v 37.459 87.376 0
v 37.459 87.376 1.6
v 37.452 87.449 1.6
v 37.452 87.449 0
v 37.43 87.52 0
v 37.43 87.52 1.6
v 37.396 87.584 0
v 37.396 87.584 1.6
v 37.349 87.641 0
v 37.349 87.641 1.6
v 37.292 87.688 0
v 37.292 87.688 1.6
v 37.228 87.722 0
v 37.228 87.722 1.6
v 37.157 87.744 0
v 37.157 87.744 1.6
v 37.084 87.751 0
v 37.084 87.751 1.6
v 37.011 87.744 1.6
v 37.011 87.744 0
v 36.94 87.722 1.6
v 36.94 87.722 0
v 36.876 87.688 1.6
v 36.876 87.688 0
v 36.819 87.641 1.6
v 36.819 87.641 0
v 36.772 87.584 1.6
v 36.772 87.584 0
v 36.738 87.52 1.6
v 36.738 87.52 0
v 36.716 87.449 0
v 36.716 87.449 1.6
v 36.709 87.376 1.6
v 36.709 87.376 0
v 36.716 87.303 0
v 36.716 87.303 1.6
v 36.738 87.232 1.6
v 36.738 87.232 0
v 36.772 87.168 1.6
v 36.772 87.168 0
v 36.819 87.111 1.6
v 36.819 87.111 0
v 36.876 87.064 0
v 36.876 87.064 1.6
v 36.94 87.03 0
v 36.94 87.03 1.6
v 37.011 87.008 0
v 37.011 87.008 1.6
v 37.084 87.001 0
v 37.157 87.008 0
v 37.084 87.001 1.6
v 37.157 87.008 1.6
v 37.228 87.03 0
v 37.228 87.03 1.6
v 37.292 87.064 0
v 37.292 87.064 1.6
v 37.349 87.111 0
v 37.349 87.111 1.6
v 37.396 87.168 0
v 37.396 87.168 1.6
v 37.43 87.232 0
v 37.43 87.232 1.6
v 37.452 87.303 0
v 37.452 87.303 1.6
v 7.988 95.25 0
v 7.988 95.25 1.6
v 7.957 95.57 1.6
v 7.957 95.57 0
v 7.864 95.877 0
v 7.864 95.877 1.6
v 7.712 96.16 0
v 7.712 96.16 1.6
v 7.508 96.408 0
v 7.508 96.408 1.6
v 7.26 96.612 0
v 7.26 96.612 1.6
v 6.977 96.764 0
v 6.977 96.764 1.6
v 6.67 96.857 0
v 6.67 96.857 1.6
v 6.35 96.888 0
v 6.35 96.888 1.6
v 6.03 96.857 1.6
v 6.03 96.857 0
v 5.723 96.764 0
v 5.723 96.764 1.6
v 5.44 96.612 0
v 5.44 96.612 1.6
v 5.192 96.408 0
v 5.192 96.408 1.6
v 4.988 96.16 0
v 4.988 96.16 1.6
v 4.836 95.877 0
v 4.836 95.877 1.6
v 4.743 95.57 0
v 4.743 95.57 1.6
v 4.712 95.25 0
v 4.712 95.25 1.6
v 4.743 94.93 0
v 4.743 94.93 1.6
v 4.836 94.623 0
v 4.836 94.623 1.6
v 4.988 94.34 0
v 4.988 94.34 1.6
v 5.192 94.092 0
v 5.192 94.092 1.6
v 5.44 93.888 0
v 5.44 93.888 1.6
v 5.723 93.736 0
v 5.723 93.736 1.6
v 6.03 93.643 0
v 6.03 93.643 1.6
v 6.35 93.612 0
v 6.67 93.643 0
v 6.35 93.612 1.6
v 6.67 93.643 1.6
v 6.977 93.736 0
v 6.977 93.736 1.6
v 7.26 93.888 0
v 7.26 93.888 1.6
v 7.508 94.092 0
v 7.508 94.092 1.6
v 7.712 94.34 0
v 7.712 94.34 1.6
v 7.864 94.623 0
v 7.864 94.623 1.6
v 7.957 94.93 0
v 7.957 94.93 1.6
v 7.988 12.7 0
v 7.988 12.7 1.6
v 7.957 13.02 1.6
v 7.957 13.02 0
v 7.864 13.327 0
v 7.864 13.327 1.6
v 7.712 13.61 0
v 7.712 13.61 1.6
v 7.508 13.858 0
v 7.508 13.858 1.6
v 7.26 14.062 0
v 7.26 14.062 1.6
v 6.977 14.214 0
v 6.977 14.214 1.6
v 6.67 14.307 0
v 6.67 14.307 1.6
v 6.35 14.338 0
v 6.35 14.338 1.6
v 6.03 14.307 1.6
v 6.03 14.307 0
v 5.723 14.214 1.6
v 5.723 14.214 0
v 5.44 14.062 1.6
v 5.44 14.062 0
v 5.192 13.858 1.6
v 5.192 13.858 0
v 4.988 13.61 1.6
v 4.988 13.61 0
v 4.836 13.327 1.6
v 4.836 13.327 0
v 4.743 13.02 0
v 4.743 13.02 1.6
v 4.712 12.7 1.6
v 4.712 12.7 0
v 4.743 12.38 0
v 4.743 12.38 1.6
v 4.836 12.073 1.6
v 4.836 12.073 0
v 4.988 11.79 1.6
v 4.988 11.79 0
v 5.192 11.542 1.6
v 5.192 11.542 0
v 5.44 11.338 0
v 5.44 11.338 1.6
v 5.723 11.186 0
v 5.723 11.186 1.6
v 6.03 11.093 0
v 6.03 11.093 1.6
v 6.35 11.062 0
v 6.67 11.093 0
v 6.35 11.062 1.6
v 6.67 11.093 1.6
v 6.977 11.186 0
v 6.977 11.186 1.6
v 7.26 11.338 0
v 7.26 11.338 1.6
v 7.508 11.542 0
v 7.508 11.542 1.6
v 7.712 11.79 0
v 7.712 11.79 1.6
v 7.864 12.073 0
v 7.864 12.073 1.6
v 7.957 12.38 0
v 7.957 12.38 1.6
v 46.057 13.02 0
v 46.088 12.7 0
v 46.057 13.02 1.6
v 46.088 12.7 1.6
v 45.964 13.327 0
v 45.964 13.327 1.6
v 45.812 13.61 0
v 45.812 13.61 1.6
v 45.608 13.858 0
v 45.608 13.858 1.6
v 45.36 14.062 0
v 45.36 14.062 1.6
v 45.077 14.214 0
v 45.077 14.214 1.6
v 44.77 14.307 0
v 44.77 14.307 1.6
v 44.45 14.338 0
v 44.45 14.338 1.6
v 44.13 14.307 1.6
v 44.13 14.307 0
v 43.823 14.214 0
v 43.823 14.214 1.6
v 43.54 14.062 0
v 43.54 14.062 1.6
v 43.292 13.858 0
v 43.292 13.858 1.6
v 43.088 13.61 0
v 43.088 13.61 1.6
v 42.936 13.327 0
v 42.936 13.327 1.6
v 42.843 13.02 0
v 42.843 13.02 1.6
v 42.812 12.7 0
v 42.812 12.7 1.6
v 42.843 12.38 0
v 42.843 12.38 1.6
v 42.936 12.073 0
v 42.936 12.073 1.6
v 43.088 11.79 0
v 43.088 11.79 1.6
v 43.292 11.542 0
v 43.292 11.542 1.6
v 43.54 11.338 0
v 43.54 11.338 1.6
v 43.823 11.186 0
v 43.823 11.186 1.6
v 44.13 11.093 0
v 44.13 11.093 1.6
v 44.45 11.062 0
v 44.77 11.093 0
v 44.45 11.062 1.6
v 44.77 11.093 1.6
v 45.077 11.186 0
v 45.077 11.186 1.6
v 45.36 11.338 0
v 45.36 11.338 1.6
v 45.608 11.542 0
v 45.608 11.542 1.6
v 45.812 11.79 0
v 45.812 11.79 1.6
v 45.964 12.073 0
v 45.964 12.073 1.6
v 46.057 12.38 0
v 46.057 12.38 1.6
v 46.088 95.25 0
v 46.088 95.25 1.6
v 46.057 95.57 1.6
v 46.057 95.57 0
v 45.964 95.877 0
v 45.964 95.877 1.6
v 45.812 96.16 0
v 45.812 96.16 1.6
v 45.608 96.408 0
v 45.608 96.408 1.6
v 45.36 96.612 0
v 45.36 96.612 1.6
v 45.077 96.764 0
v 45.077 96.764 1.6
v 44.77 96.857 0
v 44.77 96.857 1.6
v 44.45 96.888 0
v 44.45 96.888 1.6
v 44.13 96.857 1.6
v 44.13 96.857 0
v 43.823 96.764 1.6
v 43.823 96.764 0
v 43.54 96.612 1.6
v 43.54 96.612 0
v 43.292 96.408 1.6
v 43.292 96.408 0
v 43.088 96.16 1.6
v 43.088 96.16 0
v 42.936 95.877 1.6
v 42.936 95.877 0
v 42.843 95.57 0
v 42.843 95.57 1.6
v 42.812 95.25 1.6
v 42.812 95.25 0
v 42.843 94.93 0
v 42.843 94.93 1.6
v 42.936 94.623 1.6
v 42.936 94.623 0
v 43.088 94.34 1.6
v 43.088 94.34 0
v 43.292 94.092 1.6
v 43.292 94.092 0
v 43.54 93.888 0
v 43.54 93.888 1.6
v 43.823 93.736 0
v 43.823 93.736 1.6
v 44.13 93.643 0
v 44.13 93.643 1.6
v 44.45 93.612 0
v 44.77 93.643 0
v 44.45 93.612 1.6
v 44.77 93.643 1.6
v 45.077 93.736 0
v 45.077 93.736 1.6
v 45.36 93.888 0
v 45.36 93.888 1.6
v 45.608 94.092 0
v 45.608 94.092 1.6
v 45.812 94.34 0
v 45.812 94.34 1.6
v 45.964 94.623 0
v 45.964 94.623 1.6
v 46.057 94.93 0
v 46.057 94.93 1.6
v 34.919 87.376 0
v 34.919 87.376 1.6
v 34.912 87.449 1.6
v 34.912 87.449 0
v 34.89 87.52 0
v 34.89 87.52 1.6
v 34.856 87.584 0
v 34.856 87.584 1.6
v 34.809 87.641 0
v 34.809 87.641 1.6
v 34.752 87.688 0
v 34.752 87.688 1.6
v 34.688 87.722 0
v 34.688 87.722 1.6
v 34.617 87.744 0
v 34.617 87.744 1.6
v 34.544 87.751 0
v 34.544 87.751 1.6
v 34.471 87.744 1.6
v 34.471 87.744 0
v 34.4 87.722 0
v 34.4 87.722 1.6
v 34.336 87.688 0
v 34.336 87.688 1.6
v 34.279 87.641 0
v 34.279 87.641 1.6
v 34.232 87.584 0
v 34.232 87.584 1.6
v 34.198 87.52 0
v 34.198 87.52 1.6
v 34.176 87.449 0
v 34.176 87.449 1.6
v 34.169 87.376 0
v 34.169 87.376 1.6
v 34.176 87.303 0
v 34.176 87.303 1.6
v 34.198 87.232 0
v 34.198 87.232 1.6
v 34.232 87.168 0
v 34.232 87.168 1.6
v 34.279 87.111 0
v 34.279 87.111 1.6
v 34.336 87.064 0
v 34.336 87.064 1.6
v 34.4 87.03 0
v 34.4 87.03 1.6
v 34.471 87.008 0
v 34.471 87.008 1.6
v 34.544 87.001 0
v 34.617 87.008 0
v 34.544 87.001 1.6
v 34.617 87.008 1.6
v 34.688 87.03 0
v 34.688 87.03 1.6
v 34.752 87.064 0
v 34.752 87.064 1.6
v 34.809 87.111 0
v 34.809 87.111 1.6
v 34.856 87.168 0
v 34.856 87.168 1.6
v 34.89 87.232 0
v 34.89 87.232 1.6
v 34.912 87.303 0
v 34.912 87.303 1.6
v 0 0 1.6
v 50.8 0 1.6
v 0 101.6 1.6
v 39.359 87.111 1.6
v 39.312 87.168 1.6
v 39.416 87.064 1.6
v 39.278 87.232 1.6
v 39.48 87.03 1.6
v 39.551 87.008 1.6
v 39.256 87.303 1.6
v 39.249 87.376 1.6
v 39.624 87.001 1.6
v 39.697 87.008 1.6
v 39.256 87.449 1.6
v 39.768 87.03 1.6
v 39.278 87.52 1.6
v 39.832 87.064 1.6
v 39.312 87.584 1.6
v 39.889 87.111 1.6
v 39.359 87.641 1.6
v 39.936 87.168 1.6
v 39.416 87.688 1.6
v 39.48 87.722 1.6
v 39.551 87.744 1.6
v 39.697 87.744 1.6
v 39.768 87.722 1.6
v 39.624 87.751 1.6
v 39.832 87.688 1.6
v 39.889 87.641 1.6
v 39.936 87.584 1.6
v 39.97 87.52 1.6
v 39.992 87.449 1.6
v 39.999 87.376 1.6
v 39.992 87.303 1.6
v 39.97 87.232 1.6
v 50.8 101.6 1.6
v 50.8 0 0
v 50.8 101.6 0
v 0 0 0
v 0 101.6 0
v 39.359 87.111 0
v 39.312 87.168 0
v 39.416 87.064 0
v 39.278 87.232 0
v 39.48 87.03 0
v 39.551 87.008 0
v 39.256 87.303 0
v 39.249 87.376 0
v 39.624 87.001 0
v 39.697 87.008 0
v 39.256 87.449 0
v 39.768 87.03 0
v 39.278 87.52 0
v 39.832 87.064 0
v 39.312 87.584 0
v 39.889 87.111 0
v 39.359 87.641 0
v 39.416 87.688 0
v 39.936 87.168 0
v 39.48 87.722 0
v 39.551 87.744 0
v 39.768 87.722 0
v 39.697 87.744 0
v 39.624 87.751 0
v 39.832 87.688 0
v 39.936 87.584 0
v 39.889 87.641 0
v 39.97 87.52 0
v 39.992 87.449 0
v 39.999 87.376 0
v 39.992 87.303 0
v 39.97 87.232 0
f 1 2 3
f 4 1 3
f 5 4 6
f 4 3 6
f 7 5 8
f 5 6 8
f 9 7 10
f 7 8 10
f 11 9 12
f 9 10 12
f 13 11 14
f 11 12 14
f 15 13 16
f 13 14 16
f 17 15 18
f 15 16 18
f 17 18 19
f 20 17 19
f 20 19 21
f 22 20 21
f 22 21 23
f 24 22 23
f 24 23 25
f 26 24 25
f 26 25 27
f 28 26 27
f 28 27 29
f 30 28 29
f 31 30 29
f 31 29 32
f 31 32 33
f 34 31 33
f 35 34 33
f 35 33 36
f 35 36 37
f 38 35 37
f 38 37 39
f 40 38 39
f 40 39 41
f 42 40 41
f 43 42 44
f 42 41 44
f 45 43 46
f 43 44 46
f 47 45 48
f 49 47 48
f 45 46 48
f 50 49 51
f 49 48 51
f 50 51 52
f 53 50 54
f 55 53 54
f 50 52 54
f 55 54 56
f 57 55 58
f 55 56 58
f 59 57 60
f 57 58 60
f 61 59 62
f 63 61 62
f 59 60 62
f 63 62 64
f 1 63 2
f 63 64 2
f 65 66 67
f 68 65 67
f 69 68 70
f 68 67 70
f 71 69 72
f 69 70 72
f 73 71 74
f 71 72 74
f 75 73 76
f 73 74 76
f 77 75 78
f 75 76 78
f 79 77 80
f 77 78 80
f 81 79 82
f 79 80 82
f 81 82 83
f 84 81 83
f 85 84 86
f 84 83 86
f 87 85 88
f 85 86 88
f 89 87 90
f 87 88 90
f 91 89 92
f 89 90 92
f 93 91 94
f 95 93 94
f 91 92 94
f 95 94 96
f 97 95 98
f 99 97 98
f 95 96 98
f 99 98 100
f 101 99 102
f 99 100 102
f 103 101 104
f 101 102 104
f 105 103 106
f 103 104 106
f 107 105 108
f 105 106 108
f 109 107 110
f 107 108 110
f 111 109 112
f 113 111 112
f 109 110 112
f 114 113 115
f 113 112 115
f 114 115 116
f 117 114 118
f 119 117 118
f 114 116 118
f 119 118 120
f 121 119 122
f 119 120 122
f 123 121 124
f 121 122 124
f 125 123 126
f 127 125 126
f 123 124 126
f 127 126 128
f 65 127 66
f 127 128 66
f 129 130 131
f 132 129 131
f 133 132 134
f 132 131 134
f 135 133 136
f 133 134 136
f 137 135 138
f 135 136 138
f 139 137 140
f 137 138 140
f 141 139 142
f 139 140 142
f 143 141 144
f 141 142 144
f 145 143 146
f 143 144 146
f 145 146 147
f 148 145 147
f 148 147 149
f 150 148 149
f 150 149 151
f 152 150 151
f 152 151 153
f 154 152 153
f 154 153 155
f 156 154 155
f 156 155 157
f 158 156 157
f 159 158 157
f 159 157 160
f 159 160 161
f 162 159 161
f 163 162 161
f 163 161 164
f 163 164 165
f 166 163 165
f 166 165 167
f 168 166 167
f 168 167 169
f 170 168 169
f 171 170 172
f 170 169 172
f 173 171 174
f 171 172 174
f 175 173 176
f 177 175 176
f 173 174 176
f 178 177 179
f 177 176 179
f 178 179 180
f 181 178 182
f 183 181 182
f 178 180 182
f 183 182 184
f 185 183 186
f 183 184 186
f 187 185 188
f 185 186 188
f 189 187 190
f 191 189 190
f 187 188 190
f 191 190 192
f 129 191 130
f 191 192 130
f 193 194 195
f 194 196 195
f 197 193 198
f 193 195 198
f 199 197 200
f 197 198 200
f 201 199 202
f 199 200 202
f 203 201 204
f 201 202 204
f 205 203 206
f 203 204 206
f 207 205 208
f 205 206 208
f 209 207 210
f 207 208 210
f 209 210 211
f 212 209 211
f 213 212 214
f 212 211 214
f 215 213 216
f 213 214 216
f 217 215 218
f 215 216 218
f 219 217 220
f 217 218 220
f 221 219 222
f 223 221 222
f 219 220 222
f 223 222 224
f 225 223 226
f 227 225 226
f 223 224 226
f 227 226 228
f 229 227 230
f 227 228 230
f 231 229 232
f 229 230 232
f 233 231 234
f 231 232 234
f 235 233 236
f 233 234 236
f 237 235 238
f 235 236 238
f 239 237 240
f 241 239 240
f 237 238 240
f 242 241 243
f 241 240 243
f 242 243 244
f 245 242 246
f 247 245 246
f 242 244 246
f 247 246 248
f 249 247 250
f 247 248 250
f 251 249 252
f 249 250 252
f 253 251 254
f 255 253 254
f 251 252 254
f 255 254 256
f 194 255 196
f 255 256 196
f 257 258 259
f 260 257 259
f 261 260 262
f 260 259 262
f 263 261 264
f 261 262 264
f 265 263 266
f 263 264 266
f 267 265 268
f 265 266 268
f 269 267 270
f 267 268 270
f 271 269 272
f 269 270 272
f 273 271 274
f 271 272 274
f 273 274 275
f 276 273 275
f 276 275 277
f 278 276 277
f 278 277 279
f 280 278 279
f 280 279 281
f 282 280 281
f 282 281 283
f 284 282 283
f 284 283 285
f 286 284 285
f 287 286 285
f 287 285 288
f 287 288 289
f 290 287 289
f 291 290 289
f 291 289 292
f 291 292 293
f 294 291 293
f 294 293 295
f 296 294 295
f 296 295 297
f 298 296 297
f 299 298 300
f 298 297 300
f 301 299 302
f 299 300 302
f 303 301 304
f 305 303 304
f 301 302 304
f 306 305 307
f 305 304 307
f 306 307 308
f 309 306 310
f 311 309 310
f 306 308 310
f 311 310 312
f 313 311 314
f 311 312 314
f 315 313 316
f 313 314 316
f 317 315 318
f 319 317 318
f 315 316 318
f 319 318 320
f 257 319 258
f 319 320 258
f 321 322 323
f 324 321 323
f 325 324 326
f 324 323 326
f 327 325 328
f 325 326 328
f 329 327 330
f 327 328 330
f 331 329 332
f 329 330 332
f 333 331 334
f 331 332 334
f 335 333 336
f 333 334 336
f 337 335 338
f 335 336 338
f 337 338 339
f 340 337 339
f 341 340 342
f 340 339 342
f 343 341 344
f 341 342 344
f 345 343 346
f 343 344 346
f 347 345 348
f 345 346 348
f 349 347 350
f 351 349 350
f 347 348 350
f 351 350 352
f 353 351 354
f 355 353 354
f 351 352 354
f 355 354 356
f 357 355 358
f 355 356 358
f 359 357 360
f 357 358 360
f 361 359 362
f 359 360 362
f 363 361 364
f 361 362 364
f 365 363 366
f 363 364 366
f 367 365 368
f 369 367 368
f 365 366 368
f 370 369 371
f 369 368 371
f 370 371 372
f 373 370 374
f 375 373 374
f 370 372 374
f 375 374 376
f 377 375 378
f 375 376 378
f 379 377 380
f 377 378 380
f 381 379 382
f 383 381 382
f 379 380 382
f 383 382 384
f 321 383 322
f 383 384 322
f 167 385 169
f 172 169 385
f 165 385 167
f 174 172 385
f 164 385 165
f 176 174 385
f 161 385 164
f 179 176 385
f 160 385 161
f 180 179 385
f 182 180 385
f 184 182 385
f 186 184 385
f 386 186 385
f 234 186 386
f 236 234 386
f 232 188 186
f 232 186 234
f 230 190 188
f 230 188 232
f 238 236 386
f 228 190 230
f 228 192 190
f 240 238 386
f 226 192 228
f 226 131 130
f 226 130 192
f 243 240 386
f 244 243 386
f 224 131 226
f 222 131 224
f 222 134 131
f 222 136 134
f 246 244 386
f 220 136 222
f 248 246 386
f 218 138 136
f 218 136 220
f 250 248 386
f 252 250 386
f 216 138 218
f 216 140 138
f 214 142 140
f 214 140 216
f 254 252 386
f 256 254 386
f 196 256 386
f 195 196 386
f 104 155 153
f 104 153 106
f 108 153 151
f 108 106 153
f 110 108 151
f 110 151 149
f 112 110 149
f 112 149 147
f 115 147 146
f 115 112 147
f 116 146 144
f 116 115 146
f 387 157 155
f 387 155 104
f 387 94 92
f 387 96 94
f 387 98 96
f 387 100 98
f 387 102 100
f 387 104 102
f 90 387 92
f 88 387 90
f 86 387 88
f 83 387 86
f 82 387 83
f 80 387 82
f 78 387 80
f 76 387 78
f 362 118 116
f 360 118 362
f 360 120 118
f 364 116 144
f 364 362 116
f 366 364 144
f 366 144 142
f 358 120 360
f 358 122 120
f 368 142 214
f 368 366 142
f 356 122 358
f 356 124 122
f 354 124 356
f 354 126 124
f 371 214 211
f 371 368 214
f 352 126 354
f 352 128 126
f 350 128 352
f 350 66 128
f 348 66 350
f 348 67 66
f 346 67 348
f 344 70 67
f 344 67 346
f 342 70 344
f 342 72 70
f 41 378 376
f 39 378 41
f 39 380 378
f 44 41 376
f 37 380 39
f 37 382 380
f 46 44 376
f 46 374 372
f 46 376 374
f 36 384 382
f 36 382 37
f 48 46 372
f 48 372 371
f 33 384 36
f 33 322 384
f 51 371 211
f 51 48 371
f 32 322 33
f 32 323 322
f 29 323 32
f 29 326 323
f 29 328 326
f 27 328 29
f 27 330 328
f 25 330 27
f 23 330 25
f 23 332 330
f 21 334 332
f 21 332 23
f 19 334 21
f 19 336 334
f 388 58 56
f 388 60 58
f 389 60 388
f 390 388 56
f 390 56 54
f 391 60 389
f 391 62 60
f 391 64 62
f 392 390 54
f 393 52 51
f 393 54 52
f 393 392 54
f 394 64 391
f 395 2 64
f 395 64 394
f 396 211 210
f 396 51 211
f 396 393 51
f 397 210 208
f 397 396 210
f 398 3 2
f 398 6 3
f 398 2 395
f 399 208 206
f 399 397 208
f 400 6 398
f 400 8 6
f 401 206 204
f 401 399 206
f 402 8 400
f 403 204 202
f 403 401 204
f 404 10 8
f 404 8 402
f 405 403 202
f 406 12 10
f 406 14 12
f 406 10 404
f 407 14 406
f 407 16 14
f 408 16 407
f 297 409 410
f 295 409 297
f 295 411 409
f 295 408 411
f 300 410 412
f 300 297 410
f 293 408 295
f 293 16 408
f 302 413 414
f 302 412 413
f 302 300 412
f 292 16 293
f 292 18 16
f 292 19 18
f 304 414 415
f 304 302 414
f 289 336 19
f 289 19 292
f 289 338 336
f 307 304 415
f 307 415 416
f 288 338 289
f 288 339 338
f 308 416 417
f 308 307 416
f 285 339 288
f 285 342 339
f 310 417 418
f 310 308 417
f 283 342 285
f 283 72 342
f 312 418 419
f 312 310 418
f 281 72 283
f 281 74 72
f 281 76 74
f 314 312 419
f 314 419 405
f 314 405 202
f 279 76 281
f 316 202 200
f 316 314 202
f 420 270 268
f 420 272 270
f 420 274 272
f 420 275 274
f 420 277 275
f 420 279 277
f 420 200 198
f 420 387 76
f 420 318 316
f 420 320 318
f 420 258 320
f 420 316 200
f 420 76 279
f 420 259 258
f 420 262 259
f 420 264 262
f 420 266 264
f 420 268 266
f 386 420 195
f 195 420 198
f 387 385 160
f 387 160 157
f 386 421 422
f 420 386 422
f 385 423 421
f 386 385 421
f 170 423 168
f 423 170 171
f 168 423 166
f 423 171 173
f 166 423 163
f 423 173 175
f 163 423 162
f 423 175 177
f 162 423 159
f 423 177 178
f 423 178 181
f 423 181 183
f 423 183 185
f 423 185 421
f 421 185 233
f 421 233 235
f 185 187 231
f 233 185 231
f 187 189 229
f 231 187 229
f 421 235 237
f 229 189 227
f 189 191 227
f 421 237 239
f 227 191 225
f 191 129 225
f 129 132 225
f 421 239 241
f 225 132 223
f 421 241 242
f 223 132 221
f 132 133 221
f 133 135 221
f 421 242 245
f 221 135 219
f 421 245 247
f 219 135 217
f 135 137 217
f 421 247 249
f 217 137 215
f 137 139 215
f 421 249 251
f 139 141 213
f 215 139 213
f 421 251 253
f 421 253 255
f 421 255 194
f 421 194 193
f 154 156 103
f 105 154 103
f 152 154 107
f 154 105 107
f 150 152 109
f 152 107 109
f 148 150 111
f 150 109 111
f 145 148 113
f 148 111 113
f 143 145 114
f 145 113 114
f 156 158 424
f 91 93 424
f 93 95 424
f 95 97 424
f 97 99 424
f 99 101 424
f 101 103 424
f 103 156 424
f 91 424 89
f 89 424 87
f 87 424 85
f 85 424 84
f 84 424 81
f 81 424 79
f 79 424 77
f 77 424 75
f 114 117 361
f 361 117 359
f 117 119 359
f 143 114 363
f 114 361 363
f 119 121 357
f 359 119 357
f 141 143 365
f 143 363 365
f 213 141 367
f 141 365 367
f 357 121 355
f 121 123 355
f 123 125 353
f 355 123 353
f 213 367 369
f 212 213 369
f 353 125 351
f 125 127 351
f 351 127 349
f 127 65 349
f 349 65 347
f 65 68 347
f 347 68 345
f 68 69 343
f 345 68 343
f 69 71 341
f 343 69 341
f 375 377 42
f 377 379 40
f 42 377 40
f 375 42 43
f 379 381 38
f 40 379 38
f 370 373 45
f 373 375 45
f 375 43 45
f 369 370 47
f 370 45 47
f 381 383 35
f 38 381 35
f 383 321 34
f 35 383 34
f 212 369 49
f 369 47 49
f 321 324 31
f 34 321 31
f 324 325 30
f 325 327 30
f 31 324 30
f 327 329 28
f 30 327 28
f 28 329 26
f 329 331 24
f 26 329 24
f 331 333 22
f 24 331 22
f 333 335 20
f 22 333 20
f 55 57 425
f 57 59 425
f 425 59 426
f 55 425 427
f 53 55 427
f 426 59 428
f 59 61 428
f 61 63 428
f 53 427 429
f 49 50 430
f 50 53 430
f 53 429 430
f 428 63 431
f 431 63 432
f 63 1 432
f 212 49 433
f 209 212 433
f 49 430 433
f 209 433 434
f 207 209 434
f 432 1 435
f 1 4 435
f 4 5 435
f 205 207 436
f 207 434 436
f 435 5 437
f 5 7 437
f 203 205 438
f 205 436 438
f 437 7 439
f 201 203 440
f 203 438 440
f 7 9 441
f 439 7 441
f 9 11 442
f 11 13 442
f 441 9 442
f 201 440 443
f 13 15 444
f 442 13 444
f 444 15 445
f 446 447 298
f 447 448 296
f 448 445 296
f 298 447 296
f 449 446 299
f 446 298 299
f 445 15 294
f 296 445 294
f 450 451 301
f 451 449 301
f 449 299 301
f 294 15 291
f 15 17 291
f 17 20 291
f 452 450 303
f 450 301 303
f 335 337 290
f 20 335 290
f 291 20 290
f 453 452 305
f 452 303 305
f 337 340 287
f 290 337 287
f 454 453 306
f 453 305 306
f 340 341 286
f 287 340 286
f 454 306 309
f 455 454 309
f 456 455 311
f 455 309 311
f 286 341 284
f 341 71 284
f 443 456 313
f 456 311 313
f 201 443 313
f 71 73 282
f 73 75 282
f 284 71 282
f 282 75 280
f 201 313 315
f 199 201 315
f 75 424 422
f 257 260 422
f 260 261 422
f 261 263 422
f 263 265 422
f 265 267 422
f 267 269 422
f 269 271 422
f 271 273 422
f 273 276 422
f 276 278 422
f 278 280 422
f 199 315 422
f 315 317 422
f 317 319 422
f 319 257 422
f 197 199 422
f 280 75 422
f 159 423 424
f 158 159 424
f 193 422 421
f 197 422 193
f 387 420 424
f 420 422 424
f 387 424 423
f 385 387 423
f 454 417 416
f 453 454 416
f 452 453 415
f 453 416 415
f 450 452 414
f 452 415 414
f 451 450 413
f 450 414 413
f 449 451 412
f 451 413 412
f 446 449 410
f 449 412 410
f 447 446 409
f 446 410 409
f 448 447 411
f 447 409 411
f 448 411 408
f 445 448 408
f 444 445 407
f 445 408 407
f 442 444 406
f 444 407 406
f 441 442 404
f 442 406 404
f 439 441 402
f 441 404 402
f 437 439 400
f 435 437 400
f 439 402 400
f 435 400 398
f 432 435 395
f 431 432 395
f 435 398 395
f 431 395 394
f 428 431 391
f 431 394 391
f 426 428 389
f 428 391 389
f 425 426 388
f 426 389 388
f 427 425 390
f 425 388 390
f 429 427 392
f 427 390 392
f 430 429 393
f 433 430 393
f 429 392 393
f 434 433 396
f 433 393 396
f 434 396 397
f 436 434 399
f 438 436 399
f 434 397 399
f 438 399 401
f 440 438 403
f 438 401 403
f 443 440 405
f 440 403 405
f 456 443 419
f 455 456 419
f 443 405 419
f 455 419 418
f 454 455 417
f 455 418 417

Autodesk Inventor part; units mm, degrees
ref_plane "YZ Plane" through (0, 0, 0) normal (1, 0, 0) x (0, 1, 0)
ref_plane "XZ Plane" through (0, 0, 0) normal (0, 1, 0) x (-1, 0, 0)
ref_plane "XY Plane" through (0, 0, 0) normal (0, 0, 1) x (1, 0, 0)
sketch "Sketch1" plane through (0, 0, 0) normal (0, 0, 1) x (1, 0, 0)
  line L0 (0, 0) -> (50.8, 0)
  line L1 (50.8, 0) -> (50.8, 101.6)
  line L2 (50.8, 101.6) -> (0, 101.6)
  line L3 (0, 101.6) -> (0, 0)
  dimension "d2" = 50.8
  dimension "d3" = 101.6
extrude "Extrusion1" add sketch "Sketch1" along normal blind 1.6
sketch "Sketch2" plane through (0, 0, 1.6) normal (0, 0, 1) x (1, 0, 0)
  line L0 (0, 0) -> (0, 101.6) projected
  line L1 (50.8, 0) -> (0, 0) projected
  circle A0 centre (6.35, 12.7) radius 1.6383
  circle A1 centre (6.35, 95.25) radius 1.6383
  circle A2 centre (44.45, 12.7) radius 1.6383
  circle A3 centre (44.45, 95.25) radius 1.6383
  circle A4 centre (37.084, 87.376) radius 0.375
  line L2 (50.8, 101.6) -> (50.8, 0) projected
  circle A5 centre (39.624, 87.376) radius 0.375
  circle A6 centre (34.544, 87.376) radius 0.375
  dimension "d4" = 3.2766
  dimension "d7" = 82.55
  dimension "d10" = 38.1
  dimension "d13" = 6.35
  dimension "d14" = 12.7
  dimension "d17" = 0.75
  dimension "d20" = 87.376
  dimension "d21" = 13.716
  dimension "d22" = 2.54
  dimension "d23" = 2.54
extrude "Extrusion2" cut sketch "Sketch2" against normal through all
properties part number "circuitBoard"
